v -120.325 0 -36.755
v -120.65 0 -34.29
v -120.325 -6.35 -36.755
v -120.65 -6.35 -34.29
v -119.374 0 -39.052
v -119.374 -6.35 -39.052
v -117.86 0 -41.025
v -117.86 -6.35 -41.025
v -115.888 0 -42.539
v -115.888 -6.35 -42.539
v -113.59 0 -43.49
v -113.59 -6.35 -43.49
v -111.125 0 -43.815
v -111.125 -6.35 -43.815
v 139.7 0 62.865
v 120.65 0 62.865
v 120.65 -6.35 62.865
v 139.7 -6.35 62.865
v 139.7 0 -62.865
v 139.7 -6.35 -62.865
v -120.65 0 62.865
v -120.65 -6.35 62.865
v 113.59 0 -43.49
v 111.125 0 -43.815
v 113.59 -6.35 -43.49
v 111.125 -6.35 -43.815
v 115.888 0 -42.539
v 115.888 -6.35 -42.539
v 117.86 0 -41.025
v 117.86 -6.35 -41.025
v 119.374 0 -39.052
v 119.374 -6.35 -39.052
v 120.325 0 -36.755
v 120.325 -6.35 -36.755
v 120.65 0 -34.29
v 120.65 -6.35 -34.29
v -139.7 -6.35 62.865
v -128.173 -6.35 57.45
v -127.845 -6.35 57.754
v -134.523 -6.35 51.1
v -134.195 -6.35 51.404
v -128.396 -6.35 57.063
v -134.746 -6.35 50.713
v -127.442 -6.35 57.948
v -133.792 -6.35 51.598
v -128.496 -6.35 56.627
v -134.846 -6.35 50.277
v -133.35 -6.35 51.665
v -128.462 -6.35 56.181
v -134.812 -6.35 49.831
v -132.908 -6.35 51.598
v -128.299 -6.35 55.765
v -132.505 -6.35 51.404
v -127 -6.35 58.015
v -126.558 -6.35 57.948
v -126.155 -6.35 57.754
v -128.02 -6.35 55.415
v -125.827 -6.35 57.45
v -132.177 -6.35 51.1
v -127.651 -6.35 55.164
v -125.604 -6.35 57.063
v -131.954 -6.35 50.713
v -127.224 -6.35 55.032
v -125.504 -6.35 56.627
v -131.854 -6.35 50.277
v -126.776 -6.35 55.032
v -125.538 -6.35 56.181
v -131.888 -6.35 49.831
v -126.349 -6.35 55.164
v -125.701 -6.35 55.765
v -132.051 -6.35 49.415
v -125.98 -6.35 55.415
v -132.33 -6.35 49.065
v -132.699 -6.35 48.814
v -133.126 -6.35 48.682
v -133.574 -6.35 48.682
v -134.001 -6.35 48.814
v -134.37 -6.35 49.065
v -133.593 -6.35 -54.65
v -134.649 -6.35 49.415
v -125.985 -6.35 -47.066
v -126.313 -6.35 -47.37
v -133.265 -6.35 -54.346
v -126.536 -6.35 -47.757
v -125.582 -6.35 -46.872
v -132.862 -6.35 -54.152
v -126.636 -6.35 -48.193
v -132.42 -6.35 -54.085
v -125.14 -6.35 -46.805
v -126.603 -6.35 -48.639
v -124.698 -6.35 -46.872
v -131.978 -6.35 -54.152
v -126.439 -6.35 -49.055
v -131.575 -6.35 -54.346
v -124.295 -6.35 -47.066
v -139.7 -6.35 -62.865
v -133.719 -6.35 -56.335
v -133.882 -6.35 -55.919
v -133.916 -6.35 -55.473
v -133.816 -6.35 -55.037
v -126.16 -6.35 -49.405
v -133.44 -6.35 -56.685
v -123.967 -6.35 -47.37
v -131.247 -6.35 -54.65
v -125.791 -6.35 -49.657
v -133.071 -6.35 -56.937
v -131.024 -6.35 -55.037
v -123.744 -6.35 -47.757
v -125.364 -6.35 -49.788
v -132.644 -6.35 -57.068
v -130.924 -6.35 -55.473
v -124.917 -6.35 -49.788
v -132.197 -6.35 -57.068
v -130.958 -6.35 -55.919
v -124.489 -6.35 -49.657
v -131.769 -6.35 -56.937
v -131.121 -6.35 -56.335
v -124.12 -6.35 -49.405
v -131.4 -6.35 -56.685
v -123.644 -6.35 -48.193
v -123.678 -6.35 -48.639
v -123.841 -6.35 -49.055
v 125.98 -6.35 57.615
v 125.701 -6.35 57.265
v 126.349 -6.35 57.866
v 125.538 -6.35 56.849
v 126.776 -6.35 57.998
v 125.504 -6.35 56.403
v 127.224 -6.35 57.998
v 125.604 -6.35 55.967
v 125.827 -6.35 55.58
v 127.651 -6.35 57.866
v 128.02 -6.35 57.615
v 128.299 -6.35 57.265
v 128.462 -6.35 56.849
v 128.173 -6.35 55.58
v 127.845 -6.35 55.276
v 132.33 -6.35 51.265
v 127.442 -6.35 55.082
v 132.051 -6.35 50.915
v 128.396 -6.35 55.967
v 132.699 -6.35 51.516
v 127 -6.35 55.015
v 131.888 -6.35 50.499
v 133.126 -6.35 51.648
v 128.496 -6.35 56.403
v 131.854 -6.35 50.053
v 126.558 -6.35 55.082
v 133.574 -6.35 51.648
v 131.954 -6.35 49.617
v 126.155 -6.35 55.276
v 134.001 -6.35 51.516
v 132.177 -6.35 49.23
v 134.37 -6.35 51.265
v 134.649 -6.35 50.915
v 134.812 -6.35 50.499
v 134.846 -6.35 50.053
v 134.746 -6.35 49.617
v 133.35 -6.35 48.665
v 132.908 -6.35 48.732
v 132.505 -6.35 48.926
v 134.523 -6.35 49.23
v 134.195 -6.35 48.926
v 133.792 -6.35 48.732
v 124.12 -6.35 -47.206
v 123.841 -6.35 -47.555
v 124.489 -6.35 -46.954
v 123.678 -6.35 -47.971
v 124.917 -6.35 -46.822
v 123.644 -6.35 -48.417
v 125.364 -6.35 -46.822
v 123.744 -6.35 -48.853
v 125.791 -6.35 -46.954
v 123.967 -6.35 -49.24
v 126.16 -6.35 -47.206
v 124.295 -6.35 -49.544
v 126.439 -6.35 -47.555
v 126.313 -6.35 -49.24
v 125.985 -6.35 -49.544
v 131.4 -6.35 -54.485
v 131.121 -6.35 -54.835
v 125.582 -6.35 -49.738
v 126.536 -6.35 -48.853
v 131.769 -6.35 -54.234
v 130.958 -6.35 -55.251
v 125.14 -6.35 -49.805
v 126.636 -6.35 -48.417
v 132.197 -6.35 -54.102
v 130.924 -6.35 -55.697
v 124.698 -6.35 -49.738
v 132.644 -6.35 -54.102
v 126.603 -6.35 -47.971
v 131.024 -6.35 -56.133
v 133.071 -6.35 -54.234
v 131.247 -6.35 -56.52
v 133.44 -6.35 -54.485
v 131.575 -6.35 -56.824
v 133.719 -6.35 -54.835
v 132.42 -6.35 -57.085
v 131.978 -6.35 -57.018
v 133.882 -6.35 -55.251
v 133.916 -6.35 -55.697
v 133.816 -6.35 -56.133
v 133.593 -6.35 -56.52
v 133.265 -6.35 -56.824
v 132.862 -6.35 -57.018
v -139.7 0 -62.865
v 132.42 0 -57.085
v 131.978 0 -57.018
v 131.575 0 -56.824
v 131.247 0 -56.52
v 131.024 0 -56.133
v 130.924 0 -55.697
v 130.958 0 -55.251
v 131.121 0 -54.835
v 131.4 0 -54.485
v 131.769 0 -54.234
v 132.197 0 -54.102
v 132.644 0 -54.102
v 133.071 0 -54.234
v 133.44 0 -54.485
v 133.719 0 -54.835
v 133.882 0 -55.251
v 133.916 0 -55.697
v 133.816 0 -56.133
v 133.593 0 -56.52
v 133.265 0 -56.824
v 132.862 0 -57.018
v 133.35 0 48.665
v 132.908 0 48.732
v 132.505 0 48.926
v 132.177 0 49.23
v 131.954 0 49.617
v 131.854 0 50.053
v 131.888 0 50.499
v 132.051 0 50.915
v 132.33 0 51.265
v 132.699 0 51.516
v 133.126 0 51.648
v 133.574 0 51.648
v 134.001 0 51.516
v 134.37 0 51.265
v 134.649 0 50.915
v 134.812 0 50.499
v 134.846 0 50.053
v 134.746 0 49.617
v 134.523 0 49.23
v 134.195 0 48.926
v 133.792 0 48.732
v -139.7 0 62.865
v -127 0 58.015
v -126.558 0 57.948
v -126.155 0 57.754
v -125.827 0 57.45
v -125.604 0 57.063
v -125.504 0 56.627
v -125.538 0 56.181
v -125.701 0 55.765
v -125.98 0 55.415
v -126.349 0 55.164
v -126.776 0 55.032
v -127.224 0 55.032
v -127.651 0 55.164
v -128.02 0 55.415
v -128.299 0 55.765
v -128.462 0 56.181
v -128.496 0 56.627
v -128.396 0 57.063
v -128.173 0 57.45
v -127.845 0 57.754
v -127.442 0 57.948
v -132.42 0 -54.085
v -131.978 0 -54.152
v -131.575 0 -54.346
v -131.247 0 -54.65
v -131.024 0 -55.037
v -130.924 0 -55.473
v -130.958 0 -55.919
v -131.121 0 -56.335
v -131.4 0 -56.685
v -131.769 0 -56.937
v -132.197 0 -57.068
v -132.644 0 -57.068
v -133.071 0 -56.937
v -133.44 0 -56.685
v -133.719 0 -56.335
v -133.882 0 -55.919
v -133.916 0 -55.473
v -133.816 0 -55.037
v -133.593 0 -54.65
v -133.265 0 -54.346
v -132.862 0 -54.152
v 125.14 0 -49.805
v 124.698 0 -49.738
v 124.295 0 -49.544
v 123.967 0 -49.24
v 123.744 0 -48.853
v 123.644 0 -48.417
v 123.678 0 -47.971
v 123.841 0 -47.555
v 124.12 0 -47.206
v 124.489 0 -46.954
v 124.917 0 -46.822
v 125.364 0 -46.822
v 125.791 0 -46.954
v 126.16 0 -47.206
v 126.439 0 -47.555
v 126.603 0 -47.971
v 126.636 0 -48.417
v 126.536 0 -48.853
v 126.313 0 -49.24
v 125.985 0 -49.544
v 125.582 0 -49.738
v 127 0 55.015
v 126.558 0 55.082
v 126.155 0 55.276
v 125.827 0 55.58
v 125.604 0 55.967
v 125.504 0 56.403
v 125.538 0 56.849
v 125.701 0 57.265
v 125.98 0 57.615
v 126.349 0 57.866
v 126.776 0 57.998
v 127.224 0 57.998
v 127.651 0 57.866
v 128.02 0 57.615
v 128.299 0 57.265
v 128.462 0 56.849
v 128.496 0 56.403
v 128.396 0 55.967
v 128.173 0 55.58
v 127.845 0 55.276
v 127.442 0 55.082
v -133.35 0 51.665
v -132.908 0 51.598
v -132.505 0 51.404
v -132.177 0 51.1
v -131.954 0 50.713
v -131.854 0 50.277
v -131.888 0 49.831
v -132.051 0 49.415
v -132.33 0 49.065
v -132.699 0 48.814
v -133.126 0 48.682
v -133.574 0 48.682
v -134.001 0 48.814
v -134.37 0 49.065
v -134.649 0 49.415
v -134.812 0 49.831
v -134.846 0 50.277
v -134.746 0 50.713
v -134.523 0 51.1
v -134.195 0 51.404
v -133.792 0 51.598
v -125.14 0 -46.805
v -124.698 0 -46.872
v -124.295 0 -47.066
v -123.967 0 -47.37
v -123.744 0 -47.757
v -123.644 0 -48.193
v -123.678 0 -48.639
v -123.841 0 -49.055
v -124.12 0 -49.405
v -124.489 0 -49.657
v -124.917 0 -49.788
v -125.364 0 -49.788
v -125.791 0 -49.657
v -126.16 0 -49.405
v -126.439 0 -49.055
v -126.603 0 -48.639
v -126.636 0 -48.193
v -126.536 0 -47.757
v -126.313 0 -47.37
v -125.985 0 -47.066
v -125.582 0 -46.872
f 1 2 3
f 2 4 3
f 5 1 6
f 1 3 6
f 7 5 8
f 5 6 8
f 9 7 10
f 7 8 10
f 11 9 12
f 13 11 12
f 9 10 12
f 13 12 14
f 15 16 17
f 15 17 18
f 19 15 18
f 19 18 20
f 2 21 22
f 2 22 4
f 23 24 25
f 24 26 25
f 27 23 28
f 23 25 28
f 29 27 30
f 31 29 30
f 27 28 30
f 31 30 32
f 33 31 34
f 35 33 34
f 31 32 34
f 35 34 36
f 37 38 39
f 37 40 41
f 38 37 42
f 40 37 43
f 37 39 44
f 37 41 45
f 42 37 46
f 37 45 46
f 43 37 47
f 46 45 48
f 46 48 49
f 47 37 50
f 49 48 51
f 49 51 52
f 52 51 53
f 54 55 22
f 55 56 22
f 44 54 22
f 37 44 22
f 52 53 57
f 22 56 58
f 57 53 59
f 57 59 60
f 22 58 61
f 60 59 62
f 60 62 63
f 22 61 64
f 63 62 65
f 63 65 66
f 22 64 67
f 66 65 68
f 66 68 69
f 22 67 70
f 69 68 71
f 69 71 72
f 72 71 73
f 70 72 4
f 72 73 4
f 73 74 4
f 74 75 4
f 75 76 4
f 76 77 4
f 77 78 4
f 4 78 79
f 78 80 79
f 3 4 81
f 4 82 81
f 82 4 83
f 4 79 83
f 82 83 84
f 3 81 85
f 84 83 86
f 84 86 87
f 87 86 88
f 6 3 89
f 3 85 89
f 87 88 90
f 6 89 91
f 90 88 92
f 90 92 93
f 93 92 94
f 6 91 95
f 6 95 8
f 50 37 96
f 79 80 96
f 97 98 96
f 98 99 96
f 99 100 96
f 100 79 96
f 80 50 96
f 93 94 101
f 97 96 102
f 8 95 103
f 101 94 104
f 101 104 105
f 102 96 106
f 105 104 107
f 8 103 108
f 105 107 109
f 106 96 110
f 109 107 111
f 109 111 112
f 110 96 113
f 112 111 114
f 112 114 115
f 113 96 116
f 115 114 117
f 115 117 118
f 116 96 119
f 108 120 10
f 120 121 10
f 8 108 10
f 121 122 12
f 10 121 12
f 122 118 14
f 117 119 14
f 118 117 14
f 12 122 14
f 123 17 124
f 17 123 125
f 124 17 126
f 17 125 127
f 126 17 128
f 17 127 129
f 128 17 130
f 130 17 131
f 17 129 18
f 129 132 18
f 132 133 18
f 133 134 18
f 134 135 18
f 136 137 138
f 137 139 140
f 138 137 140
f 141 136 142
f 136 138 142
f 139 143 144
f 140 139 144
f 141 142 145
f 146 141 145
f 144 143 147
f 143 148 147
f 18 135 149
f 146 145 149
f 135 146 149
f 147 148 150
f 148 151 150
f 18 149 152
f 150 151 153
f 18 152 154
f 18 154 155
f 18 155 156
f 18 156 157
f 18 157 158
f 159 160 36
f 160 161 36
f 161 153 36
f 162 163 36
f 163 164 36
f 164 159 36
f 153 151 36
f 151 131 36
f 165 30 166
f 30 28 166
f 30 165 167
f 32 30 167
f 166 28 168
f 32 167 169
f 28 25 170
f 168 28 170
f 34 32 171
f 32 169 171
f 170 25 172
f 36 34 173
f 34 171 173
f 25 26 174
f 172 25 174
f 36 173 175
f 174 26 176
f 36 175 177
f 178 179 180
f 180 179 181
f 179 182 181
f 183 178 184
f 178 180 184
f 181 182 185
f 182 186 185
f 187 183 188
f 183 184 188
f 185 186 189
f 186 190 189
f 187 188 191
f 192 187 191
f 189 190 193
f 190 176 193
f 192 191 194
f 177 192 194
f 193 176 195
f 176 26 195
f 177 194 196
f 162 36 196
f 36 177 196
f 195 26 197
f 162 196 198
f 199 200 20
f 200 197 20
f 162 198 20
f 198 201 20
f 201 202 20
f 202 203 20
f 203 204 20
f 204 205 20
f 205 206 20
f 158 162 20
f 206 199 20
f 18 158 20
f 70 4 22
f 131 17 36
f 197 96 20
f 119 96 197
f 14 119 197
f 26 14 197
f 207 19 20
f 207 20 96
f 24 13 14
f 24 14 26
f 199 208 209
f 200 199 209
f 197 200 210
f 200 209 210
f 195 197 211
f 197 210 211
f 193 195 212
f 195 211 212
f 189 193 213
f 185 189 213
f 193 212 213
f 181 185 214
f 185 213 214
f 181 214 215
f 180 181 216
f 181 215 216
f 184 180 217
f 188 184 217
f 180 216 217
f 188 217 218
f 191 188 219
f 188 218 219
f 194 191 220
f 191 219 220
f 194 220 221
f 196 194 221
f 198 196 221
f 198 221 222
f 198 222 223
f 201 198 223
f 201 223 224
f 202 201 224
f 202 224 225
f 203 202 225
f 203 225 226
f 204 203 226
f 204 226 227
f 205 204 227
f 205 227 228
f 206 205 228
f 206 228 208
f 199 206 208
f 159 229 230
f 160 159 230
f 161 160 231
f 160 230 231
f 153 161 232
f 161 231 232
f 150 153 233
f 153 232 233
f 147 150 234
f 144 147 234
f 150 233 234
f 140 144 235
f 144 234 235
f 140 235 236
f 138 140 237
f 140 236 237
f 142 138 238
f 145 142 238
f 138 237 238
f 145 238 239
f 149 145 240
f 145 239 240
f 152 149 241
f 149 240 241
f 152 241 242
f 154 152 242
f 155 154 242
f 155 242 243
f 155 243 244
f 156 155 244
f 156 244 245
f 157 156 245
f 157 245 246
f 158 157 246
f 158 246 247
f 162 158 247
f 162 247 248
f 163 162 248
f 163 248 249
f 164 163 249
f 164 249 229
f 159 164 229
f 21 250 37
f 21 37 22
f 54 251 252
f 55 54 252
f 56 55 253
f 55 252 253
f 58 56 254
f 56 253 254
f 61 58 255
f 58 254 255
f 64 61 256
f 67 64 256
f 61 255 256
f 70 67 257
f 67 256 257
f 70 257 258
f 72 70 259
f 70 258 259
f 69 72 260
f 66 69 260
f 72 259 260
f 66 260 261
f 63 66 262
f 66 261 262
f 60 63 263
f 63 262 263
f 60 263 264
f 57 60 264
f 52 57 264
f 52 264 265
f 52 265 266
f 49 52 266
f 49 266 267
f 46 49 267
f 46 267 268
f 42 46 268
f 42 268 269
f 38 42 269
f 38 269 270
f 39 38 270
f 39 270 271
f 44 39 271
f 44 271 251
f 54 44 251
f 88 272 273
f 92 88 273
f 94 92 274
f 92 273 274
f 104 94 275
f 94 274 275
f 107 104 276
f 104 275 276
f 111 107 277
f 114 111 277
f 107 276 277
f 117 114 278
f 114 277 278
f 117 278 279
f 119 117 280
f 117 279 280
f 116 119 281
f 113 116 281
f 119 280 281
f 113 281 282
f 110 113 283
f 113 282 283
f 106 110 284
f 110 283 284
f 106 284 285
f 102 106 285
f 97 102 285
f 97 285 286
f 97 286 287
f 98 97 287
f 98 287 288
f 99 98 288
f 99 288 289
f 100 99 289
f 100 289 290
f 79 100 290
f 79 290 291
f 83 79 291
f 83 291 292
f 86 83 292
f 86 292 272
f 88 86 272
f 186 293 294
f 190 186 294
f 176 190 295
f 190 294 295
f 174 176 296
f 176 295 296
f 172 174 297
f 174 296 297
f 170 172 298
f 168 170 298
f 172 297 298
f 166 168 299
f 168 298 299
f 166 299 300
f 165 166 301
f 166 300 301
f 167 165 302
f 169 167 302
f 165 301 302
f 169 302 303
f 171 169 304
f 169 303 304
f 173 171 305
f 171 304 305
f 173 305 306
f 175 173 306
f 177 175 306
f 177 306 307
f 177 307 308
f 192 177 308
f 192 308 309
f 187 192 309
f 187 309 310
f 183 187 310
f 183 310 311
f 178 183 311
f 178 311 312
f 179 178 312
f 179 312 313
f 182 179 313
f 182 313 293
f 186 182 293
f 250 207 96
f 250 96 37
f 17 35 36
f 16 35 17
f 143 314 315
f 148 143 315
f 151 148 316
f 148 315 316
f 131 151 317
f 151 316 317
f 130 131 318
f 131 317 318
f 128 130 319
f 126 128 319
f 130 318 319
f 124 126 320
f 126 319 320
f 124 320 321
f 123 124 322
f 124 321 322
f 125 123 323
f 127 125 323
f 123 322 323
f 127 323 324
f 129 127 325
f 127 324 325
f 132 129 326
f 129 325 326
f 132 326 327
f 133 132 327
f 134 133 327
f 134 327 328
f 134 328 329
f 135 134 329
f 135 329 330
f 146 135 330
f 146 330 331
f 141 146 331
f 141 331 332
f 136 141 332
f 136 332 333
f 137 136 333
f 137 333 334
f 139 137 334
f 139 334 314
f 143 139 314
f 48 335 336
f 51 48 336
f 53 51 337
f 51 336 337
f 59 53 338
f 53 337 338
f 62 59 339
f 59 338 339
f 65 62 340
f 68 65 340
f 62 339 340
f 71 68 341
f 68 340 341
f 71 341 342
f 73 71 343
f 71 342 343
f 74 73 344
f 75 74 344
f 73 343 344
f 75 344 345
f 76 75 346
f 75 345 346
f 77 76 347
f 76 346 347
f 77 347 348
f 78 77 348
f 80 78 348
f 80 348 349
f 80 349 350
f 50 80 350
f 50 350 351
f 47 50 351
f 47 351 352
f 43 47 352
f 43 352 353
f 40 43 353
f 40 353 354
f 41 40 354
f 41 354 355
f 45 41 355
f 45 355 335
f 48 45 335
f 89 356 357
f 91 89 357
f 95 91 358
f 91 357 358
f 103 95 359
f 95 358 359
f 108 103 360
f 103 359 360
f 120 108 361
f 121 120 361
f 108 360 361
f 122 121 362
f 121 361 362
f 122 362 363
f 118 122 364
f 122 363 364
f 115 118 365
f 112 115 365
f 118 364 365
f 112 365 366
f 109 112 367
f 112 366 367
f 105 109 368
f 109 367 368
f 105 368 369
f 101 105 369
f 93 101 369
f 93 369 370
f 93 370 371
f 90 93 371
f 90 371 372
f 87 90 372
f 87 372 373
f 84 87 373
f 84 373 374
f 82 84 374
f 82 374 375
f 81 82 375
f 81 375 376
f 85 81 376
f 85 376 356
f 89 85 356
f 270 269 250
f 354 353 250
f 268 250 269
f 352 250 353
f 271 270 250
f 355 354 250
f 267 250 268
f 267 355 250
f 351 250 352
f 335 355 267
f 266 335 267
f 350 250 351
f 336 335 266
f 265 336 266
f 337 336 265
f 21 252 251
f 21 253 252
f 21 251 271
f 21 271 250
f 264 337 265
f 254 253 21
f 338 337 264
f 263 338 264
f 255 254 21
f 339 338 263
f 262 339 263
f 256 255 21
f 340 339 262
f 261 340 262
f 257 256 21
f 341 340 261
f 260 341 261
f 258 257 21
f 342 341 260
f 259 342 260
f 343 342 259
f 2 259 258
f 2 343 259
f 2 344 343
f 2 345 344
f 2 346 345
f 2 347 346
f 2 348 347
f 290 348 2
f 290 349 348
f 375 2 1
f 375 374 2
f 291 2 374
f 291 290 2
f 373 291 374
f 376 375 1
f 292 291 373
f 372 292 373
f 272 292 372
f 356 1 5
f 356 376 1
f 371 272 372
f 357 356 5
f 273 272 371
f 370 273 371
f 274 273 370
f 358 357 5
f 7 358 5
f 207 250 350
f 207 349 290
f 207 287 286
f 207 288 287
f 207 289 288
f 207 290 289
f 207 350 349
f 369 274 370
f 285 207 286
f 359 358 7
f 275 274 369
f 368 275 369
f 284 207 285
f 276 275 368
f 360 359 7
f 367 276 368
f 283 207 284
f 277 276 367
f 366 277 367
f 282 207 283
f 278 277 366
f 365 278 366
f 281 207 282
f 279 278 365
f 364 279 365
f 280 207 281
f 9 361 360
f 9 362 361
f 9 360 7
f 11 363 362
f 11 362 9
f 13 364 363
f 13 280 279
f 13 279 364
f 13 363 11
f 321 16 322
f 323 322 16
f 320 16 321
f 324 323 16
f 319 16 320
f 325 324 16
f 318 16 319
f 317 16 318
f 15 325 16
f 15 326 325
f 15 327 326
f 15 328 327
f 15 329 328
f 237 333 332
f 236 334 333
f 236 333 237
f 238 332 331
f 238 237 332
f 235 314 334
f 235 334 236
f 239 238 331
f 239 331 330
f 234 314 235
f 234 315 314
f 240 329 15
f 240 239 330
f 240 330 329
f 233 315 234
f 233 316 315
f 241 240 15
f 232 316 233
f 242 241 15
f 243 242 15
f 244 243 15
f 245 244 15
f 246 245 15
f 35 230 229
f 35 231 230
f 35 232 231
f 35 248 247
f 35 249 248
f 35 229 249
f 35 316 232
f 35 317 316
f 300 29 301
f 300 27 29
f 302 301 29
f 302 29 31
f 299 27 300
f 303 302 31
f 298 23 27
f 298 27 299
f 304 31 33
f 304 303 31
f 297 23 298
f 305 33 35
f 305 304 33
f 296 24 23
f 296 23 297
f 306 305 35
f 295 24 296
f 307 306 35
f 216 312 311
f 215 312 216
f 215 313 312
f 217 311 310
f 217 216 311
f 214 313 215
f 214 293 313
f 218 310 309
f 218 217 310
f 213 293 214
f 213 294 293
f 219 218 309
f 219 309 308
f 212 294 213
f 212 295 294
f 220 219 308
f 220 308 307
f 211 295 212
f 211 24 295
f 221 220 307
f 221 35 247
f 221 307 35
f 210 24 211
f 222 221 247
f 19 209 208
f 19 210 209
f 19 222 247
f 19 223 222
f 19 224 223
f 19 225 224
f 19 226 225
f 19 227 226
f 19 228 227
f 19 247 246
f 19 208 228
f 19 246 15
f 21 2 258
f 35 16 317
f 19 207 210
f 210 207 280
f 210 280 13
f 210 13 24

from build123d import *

# Parameters (mm, degrees)
BOSS_EXTRUDE1_DEPTH = 6.35
FILLET1_R           = 9.525
SKETCH2_R           = 1.5
CUT_EXTRUDE1_DEPTH  = 154.324560084


with BuildPart() as part:
    # Sketch1 → Boss-Extrude1 (new body)
    with BuildSketch(Plane(origin=(0, 0, 0), x_dir=(1, 0, 0), z_dir=(0, 1, 0))):
        Polygon((-120.65, -62.865), (-120.65, 43.815), (120.65, 43.815), (120.65, -62.865), (139.7, -62.865), (139.7, 62.865), (-139.7, 62.865), (-139.7, -62.865), align=None)
    extrude(amount=-BOSS_EXTRUDE1_DEPTH)

    # Fillet1
    fillet1_edges = [part.edges().sort_by_distance(p)[0] for p in [
        (120.65, -3.175, -43.815),
        (-120.65, -3.175, -43.815),
    ]]
    fillet(fillet1_edges, radius=FILLET1_R)

    # Sketch2 → Cut-Extrude1 (cut, through all)
    with BuildSketch(Plane(origin=(0, 0, 0), x_dir=(1, 0, 0), z_dir=(0, 1, 0))):
        with Locations(Location((-133.35, -50.165, 0), (0, 0, 270))):
            Circle(SKETCH2_R)
        with Locations(Location((-127, -56.515, 0), (0, 0, 270))):
            Circle(SKETCH2_R)
        with Locations(Location((-132.42006403, 55.58506403, 0), (0, 0, 270))):
            Circle(SKETCH2_R)
        with Locations(Location((-125.140128061, 48.305128061, 0), (0, 0, 270))):
            Circle(SKETCH2_R)
        with Locations(Location((125.140128061, 48.305128061, 0), (0, 0, 90))):
            Circle(SKETCH2_R)
        with Locations(Location((132.42006403, 55.58506403, 0), (0, 0, 90))):
            Circle(SKETCH2_R)
        with Locations(Location((127, -56.515, 0), (0, 0, 90))):
            Circle(SKETCH2_R)
        with Locations(Location((133.35, -50.165, 0), (0, 0, 90))):
            Circle(SKETCH2_R)
    extrude(amount=-CUT_EXTRUDE1_DEPTH, mode=Mode.SUBTRACT)


solid = part.part
